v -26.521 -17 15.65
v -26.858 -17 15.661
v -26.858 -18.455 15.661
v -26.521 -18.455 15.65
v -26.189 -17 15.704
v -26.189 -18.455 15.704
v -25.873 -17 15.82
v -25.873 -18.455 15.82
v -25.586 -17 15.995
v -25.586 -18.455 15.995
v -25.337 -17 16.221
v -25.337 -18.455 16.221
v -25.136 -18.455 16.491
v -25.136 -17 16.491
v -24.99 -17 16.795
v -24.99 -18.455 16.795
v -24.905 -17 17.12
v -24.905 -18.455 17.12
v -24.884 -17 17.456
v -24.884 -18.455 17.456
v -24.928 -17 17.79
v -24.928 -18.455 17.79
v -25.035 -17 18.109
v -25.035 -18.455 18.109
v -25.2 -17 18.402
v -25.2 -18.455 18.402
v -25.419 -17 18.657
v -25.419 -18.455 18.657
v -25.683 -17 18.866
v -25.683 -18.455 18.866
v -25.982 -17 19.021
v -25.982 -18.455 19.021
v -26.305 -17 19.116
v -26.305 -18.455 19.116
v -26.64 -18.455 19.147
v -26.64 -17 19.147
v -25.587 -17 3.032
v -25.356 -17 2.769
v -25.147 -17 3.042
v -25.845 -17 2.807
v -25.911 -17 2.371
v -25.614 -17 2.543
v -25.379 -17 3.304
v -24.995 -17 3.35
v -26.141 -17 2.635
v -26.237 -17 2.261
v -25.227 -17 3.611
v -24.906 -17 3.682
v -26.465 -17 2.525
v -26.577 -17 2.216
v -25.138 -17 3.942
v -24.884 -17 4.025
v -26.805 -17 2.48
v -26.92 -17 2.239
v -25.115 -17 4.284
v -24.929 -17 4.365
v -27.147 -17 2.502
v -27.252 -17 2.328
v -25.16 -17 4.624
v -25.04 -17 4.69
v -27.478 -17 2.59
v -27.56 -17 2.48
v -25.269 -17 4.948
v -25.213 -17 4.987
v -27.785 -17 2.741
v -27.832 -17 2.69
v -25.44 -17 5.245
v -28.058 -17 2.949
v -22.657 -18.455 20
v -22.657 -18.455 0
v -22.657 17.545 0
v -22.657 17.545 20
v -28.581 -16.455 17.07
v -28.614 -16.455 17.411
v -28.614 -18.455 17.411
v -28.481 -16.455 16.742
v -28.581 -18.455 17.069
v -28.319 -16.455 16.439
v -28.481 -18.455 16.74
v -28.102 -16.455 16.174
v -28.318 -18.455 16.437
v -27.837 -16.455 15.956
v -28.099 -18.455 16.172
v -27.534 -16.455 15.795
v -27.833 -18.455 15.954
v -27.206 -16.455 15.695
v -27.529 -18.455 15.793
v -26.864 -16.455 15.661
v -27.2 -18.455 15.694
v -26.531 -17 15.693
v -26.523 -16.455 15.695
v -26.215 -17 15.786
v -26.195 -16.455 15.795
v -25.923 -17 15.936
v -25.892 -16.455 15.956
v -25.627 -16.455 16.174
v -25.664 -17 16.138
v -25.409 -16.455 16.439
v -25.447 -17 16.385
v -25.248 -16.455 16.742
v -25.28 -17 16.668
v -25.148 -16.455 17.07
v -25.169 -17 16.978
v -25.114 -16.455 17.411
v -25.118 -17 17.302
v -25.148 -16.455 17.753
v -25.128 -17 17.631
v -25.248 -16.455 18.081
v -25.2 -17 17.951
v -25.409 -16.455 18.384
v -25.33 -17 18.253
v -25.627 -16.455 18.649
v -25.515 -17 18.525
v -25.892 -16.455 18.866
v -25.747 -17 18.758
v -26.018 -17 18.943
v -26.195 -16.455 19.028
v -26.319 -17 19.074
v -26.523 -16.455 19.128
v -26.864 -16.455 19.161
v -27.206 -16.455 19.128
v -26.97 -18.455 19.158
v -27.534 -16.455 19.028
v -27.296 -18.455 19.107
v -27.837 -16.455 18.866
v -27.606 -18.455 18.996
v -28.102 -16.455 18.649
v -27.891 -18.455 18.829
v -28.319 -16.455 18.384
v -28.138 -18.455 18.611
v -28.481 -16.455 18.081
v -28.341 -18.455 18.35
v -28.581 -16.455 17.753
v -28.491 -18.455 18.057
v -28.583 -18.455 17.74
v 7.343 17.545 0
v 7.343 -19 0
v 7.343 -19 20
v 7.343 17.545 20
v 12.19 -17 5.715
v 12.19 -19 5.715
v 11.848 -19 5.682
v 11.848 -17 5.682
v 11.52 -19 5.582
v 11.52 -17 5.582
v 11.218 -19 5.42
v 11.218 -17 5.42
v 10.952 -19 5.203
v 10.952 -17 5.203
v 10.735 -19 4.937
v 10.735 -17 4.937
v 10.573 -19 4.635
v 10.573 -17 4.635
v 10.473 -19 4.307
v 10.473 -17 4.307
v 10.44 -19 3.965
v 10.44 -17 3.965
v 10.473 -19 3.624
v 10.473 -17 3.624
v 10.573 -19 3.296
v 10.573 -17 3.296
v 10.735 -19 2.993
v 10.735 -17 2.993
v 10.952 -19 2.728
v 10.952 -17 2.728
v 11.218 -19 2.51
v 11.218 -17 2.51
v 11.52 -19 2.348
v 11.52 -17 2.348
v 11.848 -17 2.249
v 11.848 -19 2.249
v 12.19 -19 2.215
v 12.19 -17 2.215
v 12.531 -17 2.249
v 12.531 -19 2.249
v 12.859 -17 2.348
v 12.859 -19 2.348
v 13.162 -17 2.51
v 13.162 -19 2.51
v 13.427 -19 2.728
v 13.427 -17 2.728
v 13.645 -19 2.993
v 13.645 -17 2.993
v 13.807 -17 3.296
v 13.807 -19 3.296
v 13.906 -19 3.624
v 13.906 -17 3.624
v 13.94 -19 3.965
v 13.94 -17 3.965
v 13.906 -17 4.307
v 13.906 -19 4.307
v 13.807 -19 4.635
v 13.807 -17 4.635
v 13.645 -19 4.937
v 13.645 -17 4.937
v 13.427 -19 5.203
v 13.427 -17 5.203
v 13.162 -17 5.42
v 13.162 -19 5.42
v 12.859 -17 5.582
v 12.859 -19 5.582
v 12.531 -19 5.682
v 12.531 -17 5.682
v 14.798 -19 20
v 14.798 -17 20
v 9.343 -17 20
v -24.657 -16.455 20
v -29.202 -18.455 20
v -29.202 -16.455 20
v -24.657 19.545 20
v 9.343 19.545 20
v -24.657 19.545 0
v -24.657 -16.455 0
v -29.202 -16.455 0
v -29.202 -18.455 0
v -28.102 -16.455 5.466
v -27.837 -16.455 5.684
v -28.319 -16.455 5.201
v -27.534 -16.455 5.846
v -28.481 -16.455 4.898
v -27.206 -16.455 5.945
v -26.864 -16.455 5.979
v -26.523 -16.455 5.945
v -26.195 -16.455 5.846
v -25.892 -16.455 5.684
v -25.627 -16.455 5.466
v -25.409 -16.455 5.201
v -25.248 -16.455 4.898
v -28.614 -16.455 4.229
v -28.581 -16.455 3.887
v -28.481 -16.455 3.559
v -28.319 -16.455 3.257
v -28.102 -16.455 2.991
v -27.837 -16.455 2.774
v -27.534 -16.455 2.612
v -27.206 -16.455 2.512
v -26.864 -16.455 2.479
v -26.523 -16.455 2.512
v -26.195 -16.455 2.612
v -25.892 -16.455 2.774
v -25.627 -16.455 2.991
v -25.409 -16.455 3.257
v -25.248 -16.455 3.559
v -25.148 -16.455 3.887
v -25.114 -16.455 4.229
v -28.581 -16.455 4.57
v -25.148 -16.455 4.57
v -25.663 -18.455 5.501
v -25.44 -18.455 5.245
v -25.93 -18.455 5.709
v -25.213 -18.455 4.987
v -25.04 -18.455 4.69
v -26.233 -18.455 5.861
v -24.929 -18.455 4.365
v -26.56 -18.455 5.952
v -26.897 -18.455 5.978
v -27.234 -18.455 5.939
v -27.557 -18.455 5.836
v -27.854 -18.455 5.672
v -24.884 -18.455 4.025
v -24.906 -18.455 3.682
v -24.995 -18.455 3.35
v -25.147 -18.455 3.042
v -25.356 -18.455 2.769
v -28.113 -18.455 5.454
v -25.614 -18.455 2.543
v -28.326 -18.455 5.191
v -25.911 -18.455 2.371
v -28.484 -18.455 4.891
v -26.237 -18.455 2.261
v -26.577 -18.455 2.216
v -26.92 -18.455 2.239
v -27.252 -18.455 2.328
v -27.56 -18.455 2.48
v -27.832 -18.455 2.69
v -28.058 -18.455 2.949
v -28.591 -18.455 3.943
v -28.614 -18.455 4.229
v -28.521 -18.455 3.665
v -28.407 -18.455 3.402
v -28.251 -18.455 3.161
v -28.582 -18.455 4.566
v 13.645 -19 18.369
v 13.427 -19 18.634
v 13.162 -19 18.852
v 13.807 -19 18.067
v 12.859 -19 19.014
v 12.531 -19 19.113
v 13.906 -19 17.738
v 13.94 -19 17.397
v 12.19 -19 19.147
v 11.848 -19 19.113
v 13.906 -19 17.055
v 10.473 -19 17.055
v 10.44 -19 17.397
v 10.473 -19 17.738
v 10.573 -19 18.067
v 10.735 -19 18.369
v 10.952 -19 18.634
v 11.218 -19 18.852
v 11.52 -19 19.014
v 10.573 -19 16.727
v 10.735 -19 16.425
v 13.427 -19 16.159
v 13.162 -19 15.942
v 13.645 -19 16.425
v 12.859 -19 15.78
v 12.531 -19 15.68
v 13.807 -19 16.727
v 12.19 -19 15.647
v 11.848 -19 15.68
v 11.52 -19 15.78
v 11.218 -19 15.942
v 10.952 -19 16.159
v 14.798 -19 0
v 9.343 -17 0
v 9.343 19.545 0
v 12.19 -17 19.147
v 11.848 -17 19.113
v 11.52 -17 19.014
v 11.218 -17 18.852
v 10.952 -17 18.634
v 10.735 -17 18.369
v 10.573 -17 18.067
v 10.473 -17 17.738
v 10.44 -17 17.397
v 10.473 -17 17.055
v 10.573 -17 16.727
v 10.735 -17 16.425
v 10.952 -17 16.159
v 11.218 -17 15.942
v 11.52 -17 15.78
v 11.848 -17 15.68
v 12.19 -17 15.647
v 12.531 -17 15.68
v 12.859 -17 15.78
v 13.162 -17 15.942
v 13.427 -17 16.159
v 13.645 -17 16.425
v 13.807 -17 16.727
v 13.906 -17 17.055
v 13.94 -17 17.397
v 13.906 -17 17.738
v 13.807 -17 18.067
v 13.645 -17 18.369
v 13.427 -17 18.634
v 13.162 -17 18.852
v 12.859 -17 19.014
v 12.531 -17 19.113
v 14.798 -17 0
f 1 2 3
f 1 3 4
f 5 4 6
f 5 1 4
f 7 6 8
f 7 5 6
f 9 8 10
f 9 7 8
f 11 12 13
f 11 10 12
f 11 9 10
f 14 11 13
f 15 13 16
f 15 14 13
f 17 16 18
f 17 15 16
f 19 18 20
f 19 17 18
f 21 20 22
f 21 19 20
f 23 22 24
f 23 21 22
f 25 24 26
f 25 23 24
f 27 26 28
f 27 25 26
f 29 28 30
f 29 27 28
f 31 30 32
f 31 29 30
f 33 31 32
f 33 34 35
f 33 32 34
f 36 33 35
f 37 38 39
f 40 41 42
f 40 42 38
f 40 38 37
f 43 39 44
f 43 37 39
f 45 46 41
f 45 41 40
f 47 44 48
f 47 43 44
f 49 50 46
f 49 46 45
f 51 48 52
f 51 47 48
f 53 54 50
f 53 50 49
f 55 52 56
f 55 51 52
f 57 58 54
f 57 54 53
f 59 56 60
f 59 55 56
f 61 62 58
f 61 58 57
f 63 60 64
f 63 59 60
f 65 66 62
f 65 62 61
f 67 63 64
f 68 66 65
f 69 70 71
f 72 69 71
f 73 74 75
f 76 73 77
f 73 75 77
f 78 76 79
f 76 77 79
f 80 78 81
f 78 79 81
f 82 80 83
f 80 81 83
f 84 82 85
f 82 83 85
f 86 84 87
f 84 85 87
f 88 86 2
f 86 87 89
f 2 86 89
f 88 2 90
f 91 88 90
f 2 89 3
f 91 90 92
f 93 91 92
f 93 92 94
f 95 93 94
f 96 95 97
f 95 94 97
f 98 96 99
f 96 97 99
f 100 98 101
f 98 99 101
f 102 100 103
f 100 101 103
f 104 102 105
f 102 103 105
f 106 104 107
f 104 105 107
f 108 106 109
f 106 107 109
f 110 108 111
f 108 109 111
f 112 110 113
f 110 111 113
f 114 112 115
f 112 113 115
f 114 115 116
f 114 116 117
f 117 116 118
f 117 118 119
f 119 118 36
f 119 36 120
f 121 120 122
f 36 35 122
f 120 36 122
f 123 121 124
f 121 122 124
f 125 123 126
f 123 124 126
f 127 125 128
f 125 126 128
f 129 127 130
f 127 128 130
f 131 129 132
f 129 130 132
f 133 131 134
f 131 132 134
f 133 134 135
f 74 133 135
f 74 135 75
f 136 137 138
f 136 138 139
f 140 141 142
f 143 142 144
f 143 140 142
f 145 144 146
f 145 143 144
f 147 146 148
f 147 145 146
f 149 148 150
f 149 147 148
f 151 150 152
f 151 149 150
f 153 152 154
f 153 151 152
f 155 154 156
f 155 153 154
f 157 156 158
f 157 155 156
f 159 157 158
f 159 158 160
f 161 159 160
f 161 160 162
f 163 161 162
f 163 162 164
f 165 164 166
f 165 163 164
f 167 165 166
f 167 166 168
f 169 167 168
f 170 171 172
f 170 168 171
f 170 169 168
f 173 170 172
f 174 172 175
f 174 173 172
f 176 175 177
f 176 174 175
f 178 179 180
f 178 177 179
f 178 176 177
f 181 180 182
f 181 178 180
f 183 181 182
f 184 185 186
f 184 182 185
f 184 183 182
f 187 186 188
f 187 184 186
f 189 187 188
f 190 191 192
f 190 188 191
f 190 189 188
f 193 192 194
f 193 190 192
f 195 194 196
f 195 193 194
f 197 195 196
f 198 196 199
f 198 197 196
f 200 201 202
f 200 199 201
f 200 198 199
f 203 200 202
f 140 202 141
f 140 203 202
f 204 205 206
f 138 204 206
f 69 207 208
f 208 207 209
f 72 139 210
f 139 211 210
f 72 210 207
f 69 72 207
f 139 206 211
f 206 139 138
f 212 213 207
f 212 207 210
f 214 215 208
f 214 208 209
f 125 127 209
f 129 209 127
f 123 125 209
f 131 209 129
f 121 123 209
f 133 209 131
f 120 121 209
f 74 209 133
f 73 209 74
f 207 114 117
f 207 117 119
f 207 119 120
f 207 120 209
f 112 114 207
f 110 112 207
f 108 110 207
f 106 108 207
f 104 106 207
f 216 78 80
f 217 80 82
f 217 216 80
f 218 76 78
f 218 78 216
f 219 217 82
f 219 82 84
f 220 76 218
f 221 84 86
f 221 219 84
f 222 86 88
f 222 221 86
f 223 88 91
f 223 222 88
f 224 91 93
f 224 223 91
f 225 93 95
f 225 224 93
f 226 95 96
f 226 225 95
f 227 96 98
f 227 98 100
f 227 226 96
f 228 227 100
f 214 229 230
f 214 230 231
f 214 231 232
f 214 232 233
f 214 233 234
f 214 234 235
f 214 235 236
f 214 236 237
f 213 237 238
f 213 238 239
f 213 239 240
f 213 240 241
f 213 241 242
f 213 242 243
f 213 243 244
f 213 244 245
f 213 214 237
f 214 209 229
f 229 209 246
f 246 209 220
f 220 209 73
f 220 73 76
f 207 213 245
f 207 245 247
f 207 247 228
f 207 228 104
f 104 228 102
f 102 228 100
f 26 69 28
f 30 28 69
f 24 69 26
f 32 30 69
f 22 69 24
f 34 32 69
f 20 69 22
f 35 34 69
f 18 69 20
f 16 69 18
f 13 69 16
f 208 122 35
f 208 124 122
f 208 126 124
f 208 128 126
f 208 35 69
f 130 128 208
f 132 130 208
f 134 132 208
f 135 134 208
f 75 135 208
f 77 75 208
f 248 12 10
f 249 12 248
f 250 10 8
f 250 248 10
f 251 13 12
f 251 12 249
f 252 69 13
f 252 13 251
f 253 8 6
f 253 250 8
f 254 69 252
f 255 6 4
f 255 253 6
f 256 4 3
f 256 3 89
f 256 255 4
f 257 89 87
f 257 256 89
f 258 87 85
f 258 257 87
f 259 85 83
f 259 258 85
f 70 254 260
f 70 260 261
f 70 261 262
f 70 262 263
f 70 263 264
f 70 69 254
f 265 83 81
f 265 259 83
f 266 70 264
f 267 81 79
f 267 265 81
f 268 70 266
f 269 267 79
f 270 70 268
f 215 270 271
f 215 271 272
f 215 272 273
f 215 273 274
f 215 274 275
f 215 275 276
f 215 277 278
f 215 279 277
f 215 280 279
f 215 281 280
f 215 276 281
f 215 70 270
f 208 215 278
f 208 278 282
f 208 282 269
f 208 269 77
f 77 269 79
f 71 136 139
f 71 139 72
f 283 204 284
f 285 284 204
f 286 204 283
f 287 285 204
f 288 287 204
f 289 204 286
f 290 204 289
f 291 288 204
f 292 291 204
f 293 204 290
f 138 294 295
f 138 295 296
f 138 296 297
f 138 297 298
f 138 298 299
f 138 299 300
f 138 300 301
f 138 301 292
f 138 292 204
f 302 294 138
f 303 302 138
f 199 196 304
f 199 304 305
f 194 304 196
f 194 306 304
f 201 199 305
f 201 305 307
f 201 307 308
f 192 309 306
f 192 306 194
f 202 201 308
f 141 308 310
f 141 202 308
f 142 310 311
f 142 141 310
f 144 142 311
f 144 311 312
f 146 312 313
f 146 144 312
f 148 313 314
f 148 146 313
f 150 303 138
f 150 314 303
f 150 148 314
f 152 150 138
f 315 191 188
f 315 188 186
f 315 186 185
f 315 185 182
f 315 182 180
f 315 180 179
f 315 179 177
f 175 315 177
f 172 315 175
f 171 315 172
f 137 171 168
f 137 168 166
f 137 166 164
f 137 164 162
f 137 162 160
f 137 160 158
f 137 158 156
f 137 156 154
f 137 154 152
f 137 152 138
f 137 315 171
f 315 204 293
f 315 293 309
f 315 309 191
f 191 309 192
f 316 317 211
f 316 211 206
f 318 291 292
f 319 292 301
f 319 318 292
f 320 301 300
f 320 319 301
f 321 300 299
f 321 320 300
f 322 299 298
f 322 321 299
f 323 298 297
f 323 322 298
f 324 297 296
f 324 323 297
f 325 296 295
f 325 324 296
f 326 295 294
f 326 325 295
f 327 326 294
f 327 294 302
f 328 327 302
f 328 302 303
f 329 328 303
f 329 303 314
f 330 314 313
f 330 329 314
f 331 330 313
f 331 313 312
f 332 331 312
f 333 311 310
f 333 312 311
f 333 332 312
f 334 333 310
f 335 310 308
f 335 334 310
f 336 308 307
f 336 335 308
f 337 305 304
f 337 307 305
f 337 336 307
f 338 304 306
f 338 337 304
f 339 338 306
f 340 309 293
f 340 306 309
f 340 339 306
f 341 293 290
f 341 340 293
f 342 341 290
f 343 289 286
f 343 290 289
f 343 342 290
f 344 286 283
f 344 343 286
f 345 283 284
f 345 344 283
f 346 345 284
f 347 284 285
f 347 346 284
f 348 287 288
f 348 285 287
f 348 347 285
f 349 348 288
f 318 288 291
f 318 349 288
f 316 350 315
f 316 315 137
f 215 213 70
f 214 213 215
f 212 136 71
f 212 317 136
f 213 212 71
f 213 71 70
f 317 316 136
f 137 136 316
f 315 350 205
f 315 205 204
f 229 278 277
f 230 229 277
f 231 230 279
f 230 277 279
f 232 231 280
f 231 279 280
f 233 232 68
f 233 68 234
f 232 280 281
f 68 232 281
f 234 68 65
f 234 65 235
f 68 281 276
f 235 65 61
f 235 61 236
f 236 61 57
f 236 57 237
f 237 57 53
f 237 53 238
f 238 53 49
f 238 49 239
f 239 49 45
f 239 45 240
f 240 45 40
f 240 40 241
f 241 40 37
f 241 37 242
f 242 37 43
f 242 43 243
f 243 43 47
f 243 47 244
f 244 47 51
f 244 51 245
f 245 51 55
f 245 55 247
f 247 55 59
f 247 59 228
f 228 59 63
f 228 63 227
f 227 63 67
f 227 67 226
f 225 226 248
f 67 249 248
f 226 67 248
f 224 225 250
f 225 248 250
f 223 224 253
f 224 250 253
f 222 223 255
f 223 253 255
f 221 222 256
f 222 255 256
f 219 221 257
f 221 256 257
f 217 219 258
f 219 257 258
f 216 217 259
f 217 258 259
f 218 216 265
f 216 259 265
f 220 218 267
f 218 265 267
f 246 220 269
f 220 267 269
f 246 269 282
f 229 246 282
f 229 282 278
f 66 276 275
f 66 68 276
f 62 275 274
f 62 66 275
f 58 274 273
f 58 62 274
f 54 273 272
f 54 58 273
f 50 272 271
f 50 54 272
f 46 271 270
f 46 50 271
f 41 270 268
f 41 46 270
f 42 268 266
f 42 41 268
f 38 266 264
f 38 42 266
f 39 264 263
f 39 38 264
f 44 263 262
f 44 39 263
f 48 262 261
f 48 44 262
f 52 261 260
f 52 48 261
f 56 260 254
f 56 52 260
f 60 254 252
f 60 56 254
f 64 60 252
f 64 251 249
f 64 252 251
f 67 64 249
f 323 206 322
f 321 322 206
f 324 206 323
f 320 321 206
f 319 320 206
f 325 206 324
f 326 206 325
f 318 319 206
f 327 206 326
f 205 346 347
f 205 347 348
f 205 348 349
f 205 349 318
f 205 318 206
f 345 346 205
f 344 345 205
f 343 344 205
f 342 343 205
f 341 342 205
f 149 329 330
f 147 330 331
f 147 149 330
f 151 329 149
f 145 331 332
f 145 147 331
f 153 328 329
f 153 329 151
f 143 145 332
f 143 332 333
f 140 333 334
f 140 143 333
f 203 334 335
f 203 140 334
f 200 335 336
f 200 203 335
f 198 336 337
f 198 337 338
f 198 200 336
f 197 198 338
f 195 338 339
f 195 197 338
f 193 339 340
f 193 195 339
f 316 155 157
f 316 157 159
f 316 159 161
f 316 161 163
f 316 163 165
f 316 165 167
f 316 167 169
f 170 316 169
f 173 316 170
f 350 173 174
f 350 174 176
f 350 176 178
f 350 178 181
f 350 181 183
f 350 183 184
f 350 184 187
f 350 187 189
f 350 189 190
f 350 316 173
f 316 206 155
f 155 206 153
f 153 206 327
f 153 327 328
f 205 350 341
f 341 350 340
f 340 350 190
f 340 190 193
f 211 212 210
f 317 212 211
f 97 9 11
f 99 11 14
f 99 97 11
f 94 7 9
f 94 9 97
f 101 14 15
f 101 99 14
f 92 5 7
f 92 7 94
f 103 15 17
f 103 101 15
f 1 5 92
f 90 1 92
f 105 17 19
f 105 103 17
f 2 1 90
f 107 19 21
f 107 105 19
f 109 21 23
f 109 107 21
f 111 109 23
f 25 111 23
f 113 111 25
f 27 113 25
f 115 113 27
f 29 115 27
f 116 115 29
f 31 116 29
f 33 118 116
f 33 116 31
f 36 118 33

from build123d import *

# Parameters (mm, degrees)
RESSALTO_EXTRUS_O1_DEPTH                      = 20
BROCA_DE_ROSQUEAR_PARA_HELICOIDE_M31_AT_COUNT = 2
BROCA_DE_ROSQUEAR_PARA_HELICOIDE_M31_AT_PITCH = 13.431658115
BROCA_DE_ROSQUEAR_PARA_HELICOIDE_M31_2_COUNT  = 2
BROCA_DE_ROSQUEAR_PARA_HELICOIDE_M31_2_PITCH  = 38.822958194
BROCA_DE_ROSQUEAR_PARA_HELICOIDE_M31_3_COUNT  = 2
BROCA_DE_ROSQUEAR_PARA_HELICOIDE_M31_3_PITCH  = 41.080792624
BROCA_DE_ROSQUEAR_PARA_HELICOIDE_M32_D        = 3.5
BROCA_DE_ROSQUEAR_PARA_HELICOIDE_M32_DEPTH    = 10
BROCA_DE_ROSQUEAR_PARA_HELICOIDE_M32_TIP      = 1.051506083


with BuildPart() as part:
    # Esboço1 → Ressalto-extrusão1 (new body)
    with BuildSketch(Plane.XY):
        Polygon((-29.202088452, -18.454545455), (-29.202088452, -16.454545455), (-24.656633907, -16.454545455), (-24.656633907, 19.545454545), (9.343366093, 19.545454545), (9.343366093, -17), (14.797911548, -17), (14.797911548, -19), (7.343366093, -19), (7.343366093, 17.545454545), (-22.656633907, 17.545454545), (-22.656633907, -16.454545455), (-22.656633907, -18.454545455), align=None)
    extrude(amount=RESSALTO_EXTRUS_O1_DEPTH)

    # Esboço3 → Broca de rosquear para helicoide M31 (revolve, cut)
    with BuildSketch(Plane(origin=(12.189799686, -17, 3.965200957), x_dir=(0, 0, 1), z_dir=(1, 0, 0))):
        Polygon((0, 0), (0, 11.051506083), (1.75, 10), (1.75, 0), align=None)
    broca_de_rosquear_para_helicoide_m31 = revolve(axis=Axis((12.189799686, -10.65, 3.965200957), (0, -1, 0)), mode=Mode.SUBTRACT)

    # Broca de rosquear para helicoide M31 at: Broca de rosquear para helicoide M31 ×2
    with Locations(*[(0, 0, i * BROCA_DE_ROSQUEAR_PARA_HELICOIDE_M31_AT_PITCH) for i in range(1, BROCA_DE_ROSQUEAR_PARA_HELICOIDE_M31_AT_COUNT)]):
        add(broca_de_rosquear_para_helicoide_m31, mode=Mode.SUBTRACT)

    # Broca de rosquear para helicoide M31 2: Broca de rosquear para helicoide M31 ×2
    with Locations(*[(-i * BROCA_DE_ROSQUEAR_PARA_HELICOIDE_M31_2_PITCH, 0, 0) for i in range(1, BROCA_DE_ROSQUEAR_PARA_HELICOIDE_M31_2_COUNT)]):
        add(broca_de_rosquear_para_helicoide_m31, mode=Mode.SUBTRACT)

    # Broca de rosquear para helicoide M31 3: Broca de rosquear para helicoide M31 ×2
    with Locations(*[Vector(-0.9450391707113346, 0, 0.3269571314732758) * (i * BROCA_DE_ROSQUEAR_PARA_HELICOIDE_M31_3_PITCH) for i in range(1, BROCA_DE_ROSQUEAR_PARA_HELICOIDE_M31_3_COUNT)]):
        add(broca_de_rosquear_para_helicoide_m31, mode=Mode.SUBTRACT)

    # Broca de rosquear para helicoide M32
    with Locations(Plane(origin=(0, -16.454545455, 0), x_dir=(1, 0, 0), z_dir=(0, 1, 0))):
        with Locations((-26.864375338, -17.411313342), (-26.864375338, -4.228770119)):
            Hole(BROCA_DE_ROSQUEAR_PARA_HELICOIDE_M32_D / 2, depth=BROCA_DE_ROSQUEAR_PARA_HELICOIDE_M32_DEPTH)
            with Locations((0, 0, -(BROCA_DE_ROSQUEAR_PARA_HELICOIDE_M32_DEPTH + BROCA_DE_ROSQUEAR_PARA_HELICOIDE_M32_TIP / 2))):  # 118° drill point
                Cone(0, BROCA_DE_ROSQUEAR_PARA_HELICOIDE_M32_D / 2, BROCA_DE_ROSQUEAR_PARA_HELICOIDE_M32_TIP, mode=Mode.SUBTRACT)


solid = part.part
